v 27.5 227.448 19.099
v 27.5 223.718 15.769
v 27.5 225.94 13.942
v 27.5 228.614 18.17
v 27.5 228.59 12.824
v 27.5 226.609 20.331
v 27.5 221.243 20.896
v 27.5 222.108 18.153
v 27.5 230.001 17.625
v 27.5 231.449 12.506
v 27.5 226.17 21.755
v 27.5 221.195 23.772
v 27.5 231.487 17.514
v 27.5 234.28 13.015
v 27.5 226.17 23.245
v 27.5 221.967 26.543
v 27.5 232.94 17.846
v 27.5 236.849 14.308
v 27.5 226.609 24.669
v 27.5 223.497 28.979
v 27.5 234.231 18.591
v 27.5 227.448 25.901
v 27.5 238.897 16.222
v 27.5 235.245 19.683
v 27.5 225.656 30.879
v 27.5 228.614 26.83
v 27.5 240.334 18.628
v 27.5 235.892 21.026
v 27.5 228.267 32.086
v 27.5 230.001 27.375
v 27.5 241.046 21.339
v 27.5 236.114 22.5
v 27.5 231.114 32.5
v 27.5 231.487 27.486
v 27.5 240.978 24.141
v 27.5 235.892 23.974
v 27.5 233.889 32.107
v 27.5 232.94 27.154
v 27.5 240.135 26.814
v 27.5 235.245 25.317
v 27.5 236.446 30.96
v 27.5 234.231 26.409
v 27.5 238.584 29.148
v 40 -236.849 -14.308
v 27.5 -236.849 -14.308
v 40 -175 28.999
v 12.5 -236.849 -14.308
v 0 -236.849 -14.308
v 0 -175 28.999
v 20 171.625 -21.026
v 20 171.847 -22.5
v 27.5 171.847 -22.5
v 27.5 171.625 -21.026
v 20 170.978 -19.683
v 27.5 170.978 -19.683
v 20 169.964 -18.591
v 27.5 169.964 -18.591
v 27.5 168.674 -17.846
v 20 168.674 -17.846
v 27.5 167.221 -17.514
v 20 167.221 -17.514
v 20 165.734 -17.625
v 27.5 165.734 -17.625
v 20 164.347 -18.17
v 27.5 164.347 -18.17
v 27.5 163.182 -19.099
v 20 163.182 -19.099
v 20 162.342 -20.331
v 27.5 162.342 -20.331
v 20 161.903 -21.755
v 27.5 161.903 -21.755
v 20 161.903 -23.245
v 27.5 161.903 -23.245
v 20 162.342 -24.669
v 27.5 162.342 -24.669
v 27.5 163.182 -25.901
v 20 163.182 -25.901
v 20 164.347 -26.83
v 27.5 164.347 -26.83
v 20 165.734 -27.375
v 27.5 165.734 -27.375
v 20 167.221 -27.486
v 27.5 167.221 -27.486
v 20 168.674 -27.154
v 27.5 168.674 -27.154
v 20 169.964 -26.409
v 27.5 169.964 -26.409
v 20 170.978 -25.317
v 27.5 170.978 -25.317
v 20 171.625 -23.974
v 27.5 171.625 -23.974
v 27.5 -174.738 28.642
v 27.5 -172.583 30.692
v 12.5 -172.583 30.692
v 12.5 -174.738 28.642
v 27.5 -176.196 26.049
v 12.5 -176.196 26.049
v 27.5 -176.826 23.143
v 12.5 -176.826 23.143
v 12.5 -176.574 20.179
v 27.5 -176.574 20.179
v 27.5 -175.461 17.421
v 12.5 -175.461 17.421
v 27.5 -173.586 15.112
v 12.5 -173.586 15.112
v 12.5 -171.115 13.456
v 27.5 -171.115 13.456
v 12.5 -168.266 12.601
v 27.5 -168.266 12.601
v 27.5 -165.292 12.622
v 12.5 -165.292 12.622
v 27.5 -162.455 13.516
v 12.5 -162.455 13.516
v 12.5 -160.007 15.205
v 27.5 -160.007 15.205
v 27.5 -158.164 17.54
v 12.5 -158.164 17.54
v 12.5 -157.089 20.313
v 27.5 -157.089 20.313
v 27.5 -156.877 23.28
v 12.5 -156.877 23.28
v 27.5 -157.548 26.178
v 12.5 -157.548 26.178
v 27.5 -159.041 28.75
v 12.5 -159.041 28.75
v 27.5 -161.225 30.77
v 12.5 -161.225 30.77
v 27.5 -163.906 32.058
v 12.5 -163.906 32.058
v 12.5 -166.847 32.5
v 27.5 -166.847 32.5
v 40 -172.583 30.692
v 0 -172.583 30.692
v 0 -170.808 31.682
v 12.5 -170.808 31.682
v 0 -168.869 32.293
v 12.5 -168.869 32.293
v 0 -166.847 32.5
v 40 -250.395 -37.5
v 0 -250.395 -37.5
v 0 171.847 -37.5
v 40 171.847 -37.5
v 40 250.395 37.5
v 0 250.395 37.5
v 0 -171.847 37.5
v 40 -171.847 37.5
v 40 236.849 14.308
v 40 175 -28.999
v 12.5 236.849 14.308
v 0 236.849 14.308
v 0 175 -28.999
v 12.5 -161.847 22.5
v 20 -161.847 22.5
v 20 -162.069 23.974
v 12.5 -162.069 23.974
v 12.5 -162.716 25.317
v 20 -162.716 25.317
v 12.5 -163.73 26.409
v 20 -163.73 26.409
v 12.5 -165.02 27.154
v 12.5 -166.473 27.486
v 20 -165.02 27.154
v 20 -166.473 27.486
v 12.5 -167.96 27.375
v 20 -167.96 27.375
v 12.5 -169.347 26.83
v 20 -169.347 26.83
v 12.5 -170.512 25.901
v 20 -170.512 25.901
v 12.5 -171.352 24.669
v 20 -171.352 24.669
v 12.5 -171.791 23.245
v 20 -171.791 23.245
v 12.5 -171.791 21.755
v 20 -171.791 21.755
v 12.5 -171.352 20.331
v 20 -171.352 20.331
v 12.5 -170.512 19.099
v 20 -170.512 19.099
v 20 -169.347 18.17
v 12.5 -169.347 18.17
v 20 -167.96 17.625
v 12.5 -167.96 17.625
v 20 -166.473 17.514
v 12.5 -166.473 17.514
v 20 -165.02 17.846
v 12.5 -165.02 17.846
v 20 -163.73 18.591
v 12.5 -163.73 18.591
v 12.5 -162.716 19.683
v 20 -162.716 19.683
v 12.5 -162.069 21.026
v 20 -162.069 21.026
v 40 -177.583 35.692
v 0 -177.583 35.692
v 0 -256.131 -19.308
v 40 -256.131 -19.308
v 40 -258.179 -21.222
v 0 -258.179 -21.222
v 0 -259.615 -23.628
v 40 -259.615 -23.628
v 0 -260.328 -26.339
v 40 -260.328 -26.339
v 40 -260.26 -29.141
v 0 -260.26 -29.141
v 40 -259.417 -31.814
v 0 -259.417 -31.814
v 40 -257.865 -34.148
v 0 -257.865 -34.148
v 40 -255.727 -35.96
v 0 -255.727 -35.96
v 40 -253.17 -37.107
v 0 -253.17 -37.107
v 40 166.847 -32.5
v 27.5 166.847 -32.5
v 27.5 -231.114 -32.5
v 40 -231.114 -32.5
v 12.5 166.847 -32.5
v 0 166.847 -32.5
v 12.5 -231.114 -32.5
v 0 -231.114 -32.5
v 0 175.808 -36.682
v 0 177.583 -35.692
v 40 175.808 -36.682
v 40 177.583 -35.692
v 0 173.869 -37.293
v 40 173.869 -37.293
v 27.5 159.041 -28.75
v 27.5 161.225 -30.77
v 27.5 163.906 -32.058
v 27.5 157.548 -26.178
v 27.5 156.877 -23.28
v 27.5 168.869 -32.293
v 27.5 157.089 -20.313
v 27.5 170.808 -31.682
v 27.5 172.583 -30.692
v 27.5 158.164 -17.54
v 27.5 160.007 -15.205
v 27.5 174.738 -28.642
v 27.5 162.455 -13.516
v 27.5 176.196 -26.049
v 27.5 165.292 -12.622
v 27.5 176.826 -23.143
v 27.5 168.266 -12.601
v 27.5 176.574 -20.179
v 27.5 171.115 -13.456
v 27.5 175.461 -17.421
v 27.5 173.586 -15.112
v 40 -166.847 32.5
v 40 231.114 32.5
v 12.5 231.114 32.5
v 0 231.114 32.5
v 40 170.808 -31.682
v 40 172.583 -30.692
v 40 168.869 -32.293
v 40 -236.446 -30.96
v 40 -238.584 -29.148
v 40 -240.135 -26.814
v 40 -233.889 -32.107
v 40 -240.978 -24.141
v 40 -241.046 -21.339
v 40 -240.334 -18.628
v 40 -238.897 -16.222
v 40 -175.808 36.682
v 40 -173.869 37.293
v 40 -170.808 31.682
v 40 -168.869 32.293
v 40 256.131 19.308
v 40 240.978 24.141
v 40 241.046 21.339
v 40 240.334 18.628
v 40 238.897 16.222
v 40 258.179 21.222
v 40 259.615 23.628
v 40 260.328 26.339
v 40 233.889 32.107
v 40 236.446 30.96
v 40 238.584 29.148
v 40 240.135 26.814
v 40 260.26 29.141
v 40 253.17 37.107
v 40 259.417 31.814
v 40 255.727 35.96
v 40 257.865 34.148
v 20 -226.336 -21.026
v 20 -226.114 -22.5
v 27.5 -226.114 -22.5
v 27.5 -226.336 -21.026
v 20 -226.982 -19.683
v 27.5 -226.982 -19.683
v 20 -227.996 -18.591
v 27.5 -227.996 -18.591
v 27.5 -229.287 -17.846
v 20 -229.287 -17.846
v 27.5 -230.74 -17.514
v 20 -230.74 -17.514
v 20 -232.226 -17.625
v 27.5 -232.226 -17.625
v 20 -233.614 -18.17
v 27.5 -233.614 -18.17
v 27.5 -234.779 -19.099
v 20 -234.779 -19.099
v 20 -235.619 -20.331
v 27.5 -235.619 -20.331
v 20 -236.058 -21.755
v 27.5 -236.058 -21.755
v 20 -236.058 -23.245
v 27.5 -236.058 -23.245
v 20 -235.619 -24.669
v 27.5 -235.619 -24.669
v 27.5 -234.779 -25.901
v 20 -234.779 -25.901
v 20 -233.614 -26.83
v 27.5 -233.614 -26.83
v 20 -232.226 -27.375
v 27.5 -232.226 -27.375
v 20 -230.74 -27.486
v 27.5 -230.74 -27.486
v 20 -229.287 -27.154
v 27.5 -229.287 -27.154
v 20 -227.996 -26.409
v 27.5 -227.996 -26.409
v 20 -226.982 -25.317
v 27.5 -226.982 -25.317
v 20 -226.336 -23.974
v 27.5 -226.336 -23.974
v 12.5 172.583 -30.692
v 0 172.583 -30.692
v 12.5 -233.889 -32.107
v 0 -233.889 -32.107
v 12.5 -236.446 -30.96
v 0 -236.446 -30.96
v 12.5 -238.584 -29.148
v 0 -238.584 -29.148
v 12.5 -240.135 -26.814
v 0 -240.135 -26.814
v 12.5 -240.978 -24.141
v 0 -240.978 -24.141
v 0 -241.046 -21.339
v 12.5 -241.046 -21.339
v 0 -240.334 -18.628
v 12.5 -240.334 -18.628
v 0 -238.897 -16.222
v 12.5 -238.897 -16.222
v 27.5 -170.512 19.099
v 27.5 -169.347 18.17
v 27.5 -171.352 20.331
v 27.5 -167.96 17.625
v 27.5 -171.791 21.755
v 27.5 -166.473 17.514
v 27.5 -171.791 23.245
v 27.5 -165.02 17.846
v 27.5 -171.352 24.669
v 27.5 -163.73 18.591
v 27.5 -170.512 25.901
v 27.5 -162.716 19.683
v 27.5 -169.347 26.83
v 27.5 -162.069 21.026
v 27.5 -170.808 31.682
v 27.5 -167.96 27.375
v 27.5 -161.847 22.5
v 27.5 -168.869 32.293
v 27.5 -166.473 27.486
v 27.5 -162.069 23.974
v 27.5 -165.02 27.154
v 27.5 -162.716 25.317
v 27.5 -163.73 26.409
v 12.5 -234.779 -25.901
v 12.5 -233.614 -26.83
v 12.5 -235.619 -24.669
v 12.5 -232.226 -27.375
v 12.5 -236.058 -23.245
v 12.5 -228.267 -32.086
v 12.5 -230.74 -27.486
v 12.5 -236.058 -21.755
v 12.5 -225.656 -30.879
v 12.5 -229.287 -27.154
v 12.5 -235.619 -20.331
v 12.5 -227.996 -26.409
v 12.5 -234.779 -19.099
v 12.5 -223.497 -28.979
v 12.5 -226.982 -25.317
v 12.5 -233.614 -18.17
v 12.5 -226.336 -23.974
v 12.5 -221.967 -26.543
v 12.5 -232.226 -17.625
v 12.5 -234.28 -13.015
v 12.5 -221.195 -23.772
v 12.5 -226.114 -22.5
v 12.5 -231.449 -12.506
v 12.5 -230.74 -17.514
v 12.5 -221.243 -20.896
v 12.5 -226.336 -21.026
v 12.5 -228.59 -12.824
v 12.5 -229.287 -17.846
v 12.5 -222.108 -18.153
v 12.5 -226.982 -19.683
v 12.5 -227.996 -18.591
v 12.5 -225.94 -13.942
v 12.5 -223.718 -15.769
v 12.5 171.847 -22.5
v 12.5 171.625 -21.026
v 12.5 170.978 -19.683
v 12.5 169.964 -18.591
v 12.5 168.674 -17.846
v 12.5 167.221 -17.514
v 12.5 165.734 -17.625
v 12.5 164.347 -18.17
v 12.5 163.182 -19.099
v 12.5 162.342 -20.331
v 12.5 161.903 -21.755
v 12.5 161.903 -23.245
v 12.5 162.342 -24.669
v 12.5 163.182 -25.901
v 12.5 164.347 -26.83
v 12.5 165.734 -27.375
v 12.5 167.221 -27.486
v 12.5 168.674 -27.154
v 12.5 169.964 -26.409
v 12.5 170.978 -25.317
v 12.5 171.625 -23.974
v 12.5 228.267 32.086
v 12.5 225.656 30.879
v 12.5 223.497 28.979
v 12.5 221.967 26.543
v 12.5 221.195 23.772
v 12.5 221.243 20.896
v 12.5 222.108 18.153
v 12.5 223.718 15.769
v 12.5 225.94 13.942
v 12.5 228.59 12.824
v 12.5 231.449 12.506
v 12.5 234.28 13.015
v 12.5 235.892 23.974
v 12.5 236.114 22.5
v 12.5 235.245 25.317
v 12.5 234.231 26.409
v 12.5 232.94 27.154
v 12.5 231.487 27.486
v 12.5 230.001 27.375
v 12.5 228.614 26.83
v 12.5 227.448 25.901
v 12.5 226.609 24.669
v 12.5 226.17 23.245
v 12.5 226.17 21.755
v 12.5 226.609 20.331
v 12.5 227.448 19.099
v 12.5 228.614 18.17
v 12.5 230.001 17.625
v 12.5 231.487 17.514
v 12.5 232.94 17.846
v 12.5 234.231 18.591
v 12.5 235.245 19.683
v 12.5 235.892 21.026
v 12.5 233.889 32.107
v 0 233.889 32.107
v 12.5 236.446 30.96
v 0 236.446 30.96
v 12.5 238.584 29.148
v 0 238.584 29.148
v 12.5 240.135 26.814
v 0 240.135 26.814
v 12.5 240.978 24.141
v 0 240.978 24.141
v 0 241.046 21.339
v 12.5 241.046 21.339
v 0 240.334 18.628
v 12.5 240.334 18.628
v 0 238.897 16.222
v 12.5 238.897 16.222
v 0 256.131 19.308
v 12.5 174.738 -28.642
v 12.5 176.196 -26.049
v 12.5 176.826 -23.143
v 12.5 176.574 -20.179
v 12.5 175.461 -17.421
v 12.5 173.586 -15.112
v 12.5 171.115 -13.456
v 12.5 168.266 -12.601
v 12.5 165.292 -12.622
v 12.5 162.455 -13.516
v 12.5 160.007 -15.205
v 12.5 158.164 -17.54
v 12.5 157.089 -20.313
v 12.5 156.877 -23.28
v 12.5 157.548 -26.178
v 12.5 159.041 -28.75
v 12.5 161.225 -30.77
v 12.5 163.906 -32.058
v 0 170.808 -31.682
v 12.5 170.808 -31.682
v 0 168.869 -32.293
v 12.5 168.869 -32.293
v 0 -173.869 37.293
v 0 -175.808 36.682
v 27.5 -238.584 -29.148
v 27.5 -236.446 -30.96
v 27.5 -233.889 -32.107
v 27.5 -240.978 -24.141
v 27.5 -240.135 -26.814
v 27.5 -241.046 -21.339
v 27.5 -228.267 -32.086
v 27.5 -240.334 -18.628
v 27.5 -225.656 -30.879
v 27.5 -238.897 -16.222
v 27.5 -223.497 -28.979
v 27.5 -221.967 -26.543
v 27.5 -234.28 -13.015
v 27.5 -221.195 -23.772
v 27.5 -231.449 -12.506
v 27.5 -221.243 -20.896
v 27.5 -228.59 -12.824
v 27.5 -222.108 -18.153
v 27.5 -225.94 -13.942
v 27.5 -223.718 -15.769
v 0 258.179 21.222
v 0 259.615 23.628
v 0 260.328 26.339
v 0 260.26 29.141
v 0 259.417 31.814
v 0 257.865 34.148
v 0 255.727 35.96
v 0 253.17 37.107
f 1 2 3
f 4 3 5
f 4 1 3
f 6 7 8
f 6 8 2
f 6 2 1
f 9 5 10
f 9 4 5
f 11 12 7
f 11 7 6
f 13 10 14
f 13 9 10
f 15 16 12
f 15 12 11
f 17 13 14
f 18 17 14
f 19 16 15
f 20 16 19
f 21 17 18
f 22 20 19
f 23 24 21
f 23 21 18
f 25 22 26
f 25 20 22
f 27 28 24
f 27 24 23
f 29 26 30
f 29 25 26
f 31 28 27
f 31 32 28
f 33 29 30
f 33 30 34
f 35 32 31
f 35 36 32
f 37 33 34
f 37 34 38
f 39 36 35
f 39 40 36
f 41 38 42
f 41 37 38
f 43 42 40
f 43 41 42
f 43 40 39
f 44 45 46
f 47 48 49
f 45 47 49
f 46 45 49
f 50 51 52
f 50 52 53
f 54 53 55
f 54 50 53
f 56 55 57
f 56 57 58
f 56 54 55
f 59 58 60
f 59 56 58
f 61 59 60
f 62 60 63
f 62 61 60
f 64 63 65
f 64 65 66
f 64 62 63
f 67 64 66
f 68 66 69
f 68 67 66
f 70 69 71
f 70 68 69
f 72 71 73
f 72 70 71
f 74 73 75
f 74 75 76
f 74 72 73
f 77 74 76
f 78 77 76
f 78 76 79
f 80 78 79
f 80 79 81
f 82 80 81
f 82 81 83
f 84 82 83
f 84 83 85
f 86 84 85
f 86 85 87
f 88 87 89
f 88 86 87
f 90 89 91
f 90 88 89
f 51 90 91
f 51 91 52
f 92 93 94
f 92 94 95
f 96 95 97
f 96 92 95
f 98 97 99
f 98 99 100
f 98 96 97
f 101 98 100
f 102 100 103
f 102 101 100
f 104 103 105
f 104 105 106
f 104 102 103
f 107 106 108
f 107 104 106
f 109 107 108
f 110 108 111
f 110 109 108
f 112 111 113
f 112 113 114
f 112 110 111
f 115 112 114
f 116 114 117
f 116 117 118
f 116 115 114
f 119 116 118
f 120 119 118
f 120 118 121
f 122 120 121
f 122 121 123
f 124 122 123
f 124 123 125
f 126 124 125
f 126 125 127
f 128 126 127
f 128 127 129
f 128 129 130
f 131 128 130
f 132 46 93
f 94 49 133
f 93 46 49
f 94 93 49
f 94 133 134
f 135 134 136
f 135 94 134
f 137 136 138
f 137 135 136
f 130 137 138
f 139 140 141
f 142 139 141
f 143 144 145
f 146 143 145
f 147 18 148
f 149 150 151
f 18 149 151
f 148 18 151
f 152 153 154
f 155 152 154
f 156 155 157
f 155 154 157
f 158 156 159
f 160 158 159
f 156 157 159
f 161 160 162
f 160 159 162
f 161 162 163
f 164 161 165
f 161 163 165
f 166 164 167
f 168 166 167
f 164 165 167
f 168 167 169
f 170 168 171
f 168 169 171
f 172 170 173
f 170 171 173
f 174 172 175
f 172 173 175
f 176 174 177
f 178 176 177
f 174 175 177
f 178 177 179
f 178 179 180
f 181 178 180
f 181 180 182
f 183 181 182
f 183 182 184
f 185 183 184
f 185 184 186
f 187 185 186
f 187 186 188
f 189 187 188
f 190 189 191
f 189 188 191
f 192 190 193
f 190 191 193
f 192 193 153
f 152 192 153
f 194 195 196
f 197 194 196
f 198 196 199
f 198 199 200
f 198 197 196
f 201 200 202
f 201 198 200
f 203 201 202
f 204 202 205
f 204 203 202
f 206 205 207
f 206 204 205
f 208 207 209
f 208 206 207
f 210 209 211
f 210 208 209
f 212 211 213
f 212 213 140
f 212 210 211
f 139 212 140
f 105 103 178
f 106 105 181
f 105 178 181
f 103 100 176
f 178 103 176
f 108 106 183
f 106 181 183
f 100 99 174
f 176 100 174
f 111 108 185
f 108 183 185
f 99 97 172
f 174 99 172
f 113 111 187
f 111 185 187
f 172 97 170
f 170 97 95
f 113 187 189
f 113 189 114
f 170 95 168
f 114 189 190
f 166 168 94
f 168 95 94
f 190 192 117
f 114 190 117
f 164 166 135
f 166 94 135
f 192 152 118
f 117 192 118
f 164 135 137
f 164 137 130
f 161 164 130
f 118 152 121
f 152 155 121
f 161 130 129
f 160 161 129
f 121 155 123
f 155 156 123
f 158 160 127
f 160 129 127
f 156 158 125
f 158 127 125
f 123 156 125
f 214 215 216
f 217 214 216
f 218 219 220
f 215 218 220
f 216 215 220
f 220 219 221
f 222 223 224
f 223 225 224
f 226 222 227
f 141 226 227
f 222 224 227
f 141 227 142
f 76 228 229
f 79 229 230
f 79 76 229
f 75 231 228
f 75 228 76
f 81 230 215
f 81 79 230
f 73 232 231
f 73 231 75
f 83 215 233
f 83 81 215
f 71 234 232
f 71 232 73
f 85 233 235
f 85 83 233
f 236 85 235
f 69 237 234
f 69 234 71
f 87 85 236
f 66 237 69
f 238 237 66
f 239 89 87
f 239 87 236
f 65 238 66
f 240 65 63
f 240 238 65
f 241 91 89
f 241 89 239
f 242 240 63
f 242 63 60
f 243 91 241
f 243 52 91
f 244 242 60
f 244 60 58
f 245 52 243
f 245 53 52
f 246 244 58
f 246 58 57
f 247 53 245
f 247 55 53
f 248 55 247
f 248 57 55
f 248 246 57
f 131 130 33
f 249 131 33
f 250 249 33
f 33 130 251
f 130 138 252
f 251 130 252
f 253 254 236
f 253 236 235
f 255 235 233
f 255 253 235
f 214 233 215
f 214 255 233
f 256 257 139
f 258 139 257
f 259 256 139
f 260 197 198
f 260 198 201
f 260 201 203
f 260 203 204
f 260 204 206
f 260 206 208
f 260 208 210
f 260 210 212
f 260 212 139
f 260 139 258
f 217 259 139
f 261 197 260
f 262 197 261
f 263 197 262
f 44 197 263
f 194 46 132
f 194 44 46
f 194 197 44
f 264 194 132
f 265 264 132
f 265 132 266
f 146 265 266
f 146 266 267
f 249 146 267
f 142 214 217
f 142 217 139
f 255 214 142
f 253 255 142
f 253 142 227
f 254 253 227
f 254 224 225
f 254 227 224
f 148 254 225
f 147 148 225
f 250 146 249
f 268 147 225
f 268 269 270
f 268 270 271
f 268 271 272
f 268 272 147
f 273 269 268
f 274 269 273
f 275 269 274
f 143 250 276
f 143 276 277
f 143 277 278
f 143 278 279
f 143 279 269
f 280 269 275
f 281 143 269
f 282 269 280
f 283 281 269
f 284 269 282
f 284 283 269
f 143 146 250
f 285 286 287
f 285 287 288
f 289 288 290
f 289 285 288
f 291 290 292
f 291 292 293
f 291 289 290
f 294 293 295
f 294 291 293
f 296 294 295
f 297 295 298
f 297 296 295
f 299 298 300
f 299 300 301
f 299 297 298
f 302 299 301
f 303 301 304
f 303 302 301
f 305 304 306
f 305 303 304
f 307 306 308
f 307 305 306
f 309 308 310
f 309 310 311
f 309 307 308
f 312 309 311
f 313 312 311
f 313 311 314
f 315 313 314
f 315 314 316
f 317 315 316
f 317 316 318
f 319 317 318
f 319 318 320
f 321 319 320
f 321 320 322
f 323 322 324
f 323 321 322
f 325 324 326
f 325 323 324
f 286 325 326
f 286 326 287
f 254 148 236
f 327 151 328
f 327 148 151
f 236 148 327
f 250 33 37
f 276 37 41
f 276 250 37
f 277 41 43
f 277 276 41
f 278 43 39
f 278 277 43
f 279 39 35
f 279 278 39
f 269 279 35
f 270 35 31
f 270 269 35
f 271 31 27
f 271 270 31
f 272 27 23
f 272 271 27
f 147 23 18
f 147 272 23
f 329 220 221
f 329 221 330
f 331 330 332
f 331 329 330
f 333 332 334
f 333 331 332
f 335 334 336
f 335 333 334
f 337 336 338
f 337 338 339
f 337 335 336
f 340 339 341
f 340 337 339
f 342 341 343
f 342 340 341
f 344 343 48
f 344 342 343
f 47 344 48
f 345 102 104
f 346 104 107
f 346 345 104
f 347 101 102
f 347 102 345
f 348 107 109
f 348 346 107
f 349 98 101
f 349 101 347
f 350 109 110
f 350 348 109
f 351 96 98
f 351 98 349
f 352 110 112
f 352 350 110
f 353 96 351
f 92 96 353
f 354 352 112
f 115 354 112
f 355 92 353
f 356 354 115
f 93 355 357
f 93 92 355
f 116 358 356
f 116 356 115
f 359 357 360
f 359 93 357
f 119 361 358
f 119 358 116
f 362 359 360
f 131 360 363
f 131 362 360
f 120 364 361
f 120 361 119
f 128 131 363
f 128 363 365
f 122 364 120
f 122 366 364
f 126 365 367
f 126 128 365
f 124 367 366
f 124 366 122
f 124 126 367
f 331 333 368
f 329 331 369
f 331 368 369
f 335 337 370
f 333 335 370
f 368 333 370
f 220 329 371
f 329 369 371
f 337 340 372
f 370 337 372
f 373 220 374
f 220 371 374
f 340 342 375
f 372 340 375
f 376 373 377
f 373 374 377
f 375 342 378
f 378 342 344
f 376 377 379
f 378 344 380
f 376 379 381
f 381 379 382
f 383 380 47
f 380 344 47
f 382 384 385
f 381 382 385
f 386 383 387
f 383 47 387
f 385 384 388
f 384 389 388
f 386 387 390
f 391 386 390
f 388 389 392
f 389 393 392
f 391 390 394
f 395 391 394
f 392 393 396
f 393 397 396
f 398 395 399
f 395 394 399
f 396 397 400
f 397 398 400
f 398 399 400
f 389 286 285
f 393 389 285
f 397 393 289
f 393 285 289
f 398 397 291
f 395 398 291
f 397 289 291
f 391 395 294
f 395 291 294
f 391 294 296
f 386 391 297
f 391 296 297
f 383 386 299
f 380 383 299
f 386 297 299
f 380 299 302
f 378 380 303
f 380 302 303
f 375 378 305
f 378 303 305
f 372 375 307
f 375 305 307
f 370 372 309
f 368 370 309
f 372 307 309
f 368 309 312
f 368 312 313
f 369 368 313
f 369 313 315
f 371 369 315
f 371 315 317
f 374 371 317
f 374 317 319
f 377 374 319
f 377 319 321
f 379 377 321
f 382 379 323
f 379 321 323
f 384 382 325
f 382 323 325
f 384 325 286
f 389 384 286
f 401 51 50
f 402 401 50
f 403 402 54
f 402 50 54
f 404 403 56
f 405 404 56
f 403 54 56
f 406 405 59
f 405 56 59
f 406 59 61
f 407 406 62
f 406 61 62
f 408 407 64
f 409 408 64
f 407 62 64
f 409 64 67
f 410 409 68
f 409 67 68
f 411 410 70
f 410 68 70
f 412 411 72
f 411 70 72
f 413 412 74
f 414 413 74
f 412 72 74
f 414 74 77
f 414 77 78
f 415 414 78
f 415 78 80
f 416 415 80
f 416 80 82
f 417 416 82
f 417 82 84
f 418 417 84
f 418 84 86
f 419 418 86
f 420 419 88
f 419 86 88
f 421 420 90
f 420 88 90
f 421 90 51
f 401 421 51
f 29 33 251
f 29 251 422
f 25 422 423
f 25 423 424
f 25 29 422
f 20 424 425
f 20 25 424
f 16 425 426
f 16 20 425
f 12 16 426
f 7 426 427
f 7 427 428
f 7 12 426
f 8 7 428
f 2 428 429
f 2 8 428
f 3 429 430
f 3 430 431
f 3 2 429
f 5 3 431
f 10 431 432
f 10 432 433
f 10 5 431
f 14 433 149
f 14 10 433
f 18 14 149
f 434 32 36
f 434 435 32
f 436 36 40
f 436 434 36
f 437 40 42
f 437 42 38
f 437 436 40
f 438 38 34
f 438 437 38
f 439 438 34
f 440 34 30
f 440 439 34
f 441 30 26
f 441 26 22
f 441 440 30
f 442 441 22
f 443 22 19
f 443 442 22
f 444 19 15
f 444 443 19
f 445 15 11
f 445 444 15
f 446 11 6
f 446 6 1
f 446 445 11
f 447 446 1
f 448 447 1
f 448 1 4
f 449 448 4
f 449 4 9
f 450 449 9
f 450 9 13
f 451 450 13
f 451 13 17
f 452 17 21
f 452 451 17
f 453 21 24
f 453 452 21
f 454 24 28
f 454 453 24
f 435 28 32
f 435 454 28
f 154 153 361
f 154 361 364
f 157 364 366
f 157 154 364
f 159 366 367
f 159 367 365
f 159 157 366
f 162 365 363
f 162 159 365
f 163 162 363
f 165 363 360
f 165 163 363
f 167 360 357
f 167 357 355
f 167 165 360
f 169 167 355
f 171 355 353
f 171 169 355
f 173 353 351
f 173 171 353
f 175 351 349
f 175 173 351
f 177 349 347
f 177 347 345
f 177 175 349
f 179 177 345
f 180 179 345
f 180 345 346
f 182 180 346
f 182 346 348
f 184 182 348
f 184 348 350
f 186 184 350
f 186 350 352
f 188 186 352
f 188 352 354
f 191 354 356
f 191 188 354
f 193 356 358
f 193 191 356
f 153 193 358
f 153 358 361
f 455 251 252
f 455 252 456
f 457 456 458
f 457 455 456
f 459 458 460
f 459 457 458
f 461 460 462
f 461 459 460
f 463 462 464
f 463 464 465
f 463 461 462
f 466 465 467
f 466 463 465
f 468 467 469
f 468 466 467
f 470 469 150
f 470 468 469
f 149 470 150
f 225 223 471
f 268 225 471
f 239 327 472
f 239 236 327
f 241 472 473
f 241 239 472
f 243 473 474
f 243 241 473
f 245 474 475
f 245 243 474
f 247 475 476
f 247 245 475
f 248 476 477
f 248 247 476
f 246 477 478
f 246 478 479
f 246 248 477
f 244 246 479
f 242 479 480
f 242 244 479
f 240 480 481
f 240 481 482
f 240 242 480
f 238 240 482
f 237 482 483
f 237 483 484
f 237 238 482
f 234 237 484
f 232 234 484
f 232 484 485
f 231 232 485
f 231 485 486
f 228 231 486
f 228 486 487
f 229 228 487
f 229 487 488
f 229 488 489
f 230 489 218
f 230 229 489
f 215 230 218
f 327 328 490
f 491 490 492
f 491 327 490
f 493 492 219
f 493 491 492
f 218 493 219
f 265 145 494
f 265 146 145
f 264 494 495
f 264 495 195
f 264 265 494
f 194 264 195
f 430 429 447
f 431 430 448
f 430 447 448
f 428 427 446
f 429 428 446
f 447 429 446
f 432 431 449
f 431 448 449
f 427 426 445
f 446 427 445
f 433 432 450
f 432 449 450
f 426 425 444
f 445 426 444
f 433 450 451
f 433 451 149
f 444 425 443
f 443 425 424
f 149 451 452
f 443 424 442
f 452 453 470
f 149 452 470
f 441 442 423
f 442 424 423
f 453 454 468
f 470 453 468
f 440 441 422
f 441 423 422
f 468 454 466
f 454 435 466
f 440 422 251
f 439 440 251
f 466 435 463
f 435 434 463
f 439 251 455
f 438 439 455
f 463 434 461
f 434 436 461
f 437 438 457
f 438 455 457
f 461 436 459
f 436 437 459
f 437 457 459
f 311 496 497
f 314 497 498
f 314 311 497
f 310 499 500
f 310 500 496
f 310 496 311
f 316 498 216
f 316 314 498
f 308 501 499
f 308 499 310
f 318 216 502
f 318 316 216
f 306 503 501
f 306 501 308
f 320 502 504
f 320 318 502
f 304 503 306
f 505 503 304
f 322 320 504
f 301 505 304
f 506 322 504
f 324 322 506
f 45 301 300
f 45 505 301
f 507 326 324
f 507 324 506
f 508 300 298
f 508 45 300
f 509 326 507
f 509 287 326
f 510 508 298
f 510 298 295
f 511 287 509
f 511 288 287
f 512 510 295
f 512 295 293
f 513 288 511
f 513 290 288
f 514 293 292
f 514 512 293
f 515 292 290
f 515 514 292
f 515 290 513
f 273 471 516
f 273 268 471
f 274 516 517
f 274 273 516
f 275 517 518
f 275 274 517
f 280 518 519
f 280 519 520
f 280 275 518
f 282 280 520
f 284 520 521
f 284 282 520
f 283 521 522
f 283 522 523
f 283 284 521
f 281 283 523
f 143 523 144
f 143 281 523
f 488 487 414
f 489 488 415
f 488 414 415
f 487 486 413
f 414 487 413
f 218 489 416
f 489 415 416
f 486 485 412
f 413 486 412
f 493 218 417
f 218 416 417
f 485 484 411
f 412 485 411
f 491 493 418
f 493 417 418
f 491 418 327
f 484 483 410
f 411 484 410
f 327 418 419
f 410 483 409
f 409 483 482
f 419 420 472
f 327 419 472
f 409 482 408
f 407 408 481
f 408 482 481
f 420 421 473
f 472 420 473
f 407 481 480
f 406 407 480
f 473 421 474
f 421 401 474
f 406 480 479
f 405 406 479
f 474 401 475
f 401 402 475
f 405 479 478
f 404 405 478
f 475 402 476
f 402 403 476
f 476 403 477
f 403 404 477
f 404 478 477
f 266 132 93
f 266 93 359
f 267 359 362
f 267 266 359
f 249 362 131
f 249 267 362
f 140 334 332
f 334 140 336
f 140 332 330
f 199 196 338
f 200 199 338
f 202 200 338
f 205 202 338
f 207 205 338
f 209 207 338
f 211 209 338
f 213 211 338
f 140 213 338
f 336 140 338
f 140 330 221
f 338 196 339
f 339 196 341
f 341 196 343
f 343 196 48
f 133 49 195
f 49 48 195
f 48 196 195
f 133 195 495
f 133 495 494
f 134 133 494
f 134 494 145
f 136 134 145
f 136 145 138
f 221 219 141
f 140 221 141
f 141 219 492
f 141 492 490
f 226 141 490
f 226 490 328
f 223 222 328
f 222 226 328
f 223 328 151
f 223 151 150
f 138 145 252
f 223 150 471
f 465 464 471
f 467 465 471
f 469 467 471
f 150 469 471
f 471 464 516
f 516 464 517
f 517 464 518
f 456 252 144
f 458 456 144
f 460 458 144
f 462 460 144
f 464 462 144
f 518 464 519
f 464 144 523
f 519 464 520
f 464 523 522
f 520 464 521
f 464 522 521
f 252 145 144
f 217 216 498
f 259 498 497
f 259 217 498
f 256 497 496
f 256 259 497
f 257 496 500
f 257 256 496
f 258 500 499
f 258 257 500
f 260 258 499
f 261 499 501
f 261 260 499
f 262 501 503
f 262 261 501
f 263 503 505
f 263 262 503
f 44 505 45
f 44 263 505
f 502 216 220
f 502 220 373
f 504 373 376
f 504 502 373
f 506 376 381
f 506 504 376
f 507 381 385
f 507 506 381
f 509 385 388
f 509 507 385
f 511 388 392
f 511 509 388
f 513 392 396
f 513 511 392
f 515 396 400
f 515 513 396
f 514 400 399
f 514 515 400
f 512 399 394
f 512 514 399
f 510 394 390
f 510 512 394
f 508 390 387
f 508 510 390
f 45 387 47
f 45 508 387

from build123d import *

# Parameters (mm, degrees)
F2_DEPTH = 40
F3_R     = 10
F4_R     = 10
F4_R_2   = 5
F5_DEPTH = 7.5


with BuildPart() as f2:
    # F1 (on Right) → F2 (new body)
    with BuildSketch(Plane.YZ):
        Polygon((175, 32.5), (175, 37.5), (-175, 37.5), (-175, 28.998962), (-170, 32.5), (170, 32.5), align=None)
        Polygon((282.111101, 37.5), (175, 37.5), (175, 32.5), (262.82962, 32.5), (175, -28.998962), (175, -37.5), align=None)
        Polygon((-175, 28.998962), (-175, 37.5), (-282.111101, -37.5), (-175, -37.5), (-175, -32.5), (-262.82962, -32.5), align=None)
        Polygon((175, -37.5), (175, -28.998962), (170, -32.5), (-170, -32.5), (-175, -32.5), (-175, -37.5), align=None)
    extrude(amount=F2_DEPTH)

    # F3
    f3_edges = [f2.edges().sort_by_distance(p)[0] for p in [
        (20, 282.111101, 37.5),
        (20, 262.82962, 32.5),
        (20, 170, -32.5),
        (20, -282.111101, -37.5),
        (20, -175, 37.5),
        (20, -170, 32.5),
        (20, -262.82962, -32.5),
        (20, 175, -37.5),
    ]]
    fillet(f3_edges, radius=F3_R)

    # F4 (on offset) → F5 (join, symmetric)
    with BuildSketch(Plane.YZ.offset(20)):
        with Locations((-166.847012, 22.5)):
            Circle(F4_R)
        with Locations((-166.847012, 22.5)):
            Circle(F4_R_2, mode=Mode.SUBTRACT)
        with Locations((-231.113672, -22.5)):
            Circle(F4_R)
        with Locations((-231.113672, -22.5)):
            Circle(F4_R_2, mode=Mode.SUBTRACT)
        with Locations((166.847012, -22.5)):
            Circle(F4_R)
        with Locations((166.847012, -22.5)):
            Circle(F4_R_2, mode=Mode.SUBTRACT)
        with Locations((231.113672, 22.5)):
            Circle(F4_R)
        with Locations((231.113672, 22.5)):
            Circle(F4_R_2, mode=Mode.SUBTRACT)
    extrude(amount=F5_DEPTH, both=True)


solid = f2.part
